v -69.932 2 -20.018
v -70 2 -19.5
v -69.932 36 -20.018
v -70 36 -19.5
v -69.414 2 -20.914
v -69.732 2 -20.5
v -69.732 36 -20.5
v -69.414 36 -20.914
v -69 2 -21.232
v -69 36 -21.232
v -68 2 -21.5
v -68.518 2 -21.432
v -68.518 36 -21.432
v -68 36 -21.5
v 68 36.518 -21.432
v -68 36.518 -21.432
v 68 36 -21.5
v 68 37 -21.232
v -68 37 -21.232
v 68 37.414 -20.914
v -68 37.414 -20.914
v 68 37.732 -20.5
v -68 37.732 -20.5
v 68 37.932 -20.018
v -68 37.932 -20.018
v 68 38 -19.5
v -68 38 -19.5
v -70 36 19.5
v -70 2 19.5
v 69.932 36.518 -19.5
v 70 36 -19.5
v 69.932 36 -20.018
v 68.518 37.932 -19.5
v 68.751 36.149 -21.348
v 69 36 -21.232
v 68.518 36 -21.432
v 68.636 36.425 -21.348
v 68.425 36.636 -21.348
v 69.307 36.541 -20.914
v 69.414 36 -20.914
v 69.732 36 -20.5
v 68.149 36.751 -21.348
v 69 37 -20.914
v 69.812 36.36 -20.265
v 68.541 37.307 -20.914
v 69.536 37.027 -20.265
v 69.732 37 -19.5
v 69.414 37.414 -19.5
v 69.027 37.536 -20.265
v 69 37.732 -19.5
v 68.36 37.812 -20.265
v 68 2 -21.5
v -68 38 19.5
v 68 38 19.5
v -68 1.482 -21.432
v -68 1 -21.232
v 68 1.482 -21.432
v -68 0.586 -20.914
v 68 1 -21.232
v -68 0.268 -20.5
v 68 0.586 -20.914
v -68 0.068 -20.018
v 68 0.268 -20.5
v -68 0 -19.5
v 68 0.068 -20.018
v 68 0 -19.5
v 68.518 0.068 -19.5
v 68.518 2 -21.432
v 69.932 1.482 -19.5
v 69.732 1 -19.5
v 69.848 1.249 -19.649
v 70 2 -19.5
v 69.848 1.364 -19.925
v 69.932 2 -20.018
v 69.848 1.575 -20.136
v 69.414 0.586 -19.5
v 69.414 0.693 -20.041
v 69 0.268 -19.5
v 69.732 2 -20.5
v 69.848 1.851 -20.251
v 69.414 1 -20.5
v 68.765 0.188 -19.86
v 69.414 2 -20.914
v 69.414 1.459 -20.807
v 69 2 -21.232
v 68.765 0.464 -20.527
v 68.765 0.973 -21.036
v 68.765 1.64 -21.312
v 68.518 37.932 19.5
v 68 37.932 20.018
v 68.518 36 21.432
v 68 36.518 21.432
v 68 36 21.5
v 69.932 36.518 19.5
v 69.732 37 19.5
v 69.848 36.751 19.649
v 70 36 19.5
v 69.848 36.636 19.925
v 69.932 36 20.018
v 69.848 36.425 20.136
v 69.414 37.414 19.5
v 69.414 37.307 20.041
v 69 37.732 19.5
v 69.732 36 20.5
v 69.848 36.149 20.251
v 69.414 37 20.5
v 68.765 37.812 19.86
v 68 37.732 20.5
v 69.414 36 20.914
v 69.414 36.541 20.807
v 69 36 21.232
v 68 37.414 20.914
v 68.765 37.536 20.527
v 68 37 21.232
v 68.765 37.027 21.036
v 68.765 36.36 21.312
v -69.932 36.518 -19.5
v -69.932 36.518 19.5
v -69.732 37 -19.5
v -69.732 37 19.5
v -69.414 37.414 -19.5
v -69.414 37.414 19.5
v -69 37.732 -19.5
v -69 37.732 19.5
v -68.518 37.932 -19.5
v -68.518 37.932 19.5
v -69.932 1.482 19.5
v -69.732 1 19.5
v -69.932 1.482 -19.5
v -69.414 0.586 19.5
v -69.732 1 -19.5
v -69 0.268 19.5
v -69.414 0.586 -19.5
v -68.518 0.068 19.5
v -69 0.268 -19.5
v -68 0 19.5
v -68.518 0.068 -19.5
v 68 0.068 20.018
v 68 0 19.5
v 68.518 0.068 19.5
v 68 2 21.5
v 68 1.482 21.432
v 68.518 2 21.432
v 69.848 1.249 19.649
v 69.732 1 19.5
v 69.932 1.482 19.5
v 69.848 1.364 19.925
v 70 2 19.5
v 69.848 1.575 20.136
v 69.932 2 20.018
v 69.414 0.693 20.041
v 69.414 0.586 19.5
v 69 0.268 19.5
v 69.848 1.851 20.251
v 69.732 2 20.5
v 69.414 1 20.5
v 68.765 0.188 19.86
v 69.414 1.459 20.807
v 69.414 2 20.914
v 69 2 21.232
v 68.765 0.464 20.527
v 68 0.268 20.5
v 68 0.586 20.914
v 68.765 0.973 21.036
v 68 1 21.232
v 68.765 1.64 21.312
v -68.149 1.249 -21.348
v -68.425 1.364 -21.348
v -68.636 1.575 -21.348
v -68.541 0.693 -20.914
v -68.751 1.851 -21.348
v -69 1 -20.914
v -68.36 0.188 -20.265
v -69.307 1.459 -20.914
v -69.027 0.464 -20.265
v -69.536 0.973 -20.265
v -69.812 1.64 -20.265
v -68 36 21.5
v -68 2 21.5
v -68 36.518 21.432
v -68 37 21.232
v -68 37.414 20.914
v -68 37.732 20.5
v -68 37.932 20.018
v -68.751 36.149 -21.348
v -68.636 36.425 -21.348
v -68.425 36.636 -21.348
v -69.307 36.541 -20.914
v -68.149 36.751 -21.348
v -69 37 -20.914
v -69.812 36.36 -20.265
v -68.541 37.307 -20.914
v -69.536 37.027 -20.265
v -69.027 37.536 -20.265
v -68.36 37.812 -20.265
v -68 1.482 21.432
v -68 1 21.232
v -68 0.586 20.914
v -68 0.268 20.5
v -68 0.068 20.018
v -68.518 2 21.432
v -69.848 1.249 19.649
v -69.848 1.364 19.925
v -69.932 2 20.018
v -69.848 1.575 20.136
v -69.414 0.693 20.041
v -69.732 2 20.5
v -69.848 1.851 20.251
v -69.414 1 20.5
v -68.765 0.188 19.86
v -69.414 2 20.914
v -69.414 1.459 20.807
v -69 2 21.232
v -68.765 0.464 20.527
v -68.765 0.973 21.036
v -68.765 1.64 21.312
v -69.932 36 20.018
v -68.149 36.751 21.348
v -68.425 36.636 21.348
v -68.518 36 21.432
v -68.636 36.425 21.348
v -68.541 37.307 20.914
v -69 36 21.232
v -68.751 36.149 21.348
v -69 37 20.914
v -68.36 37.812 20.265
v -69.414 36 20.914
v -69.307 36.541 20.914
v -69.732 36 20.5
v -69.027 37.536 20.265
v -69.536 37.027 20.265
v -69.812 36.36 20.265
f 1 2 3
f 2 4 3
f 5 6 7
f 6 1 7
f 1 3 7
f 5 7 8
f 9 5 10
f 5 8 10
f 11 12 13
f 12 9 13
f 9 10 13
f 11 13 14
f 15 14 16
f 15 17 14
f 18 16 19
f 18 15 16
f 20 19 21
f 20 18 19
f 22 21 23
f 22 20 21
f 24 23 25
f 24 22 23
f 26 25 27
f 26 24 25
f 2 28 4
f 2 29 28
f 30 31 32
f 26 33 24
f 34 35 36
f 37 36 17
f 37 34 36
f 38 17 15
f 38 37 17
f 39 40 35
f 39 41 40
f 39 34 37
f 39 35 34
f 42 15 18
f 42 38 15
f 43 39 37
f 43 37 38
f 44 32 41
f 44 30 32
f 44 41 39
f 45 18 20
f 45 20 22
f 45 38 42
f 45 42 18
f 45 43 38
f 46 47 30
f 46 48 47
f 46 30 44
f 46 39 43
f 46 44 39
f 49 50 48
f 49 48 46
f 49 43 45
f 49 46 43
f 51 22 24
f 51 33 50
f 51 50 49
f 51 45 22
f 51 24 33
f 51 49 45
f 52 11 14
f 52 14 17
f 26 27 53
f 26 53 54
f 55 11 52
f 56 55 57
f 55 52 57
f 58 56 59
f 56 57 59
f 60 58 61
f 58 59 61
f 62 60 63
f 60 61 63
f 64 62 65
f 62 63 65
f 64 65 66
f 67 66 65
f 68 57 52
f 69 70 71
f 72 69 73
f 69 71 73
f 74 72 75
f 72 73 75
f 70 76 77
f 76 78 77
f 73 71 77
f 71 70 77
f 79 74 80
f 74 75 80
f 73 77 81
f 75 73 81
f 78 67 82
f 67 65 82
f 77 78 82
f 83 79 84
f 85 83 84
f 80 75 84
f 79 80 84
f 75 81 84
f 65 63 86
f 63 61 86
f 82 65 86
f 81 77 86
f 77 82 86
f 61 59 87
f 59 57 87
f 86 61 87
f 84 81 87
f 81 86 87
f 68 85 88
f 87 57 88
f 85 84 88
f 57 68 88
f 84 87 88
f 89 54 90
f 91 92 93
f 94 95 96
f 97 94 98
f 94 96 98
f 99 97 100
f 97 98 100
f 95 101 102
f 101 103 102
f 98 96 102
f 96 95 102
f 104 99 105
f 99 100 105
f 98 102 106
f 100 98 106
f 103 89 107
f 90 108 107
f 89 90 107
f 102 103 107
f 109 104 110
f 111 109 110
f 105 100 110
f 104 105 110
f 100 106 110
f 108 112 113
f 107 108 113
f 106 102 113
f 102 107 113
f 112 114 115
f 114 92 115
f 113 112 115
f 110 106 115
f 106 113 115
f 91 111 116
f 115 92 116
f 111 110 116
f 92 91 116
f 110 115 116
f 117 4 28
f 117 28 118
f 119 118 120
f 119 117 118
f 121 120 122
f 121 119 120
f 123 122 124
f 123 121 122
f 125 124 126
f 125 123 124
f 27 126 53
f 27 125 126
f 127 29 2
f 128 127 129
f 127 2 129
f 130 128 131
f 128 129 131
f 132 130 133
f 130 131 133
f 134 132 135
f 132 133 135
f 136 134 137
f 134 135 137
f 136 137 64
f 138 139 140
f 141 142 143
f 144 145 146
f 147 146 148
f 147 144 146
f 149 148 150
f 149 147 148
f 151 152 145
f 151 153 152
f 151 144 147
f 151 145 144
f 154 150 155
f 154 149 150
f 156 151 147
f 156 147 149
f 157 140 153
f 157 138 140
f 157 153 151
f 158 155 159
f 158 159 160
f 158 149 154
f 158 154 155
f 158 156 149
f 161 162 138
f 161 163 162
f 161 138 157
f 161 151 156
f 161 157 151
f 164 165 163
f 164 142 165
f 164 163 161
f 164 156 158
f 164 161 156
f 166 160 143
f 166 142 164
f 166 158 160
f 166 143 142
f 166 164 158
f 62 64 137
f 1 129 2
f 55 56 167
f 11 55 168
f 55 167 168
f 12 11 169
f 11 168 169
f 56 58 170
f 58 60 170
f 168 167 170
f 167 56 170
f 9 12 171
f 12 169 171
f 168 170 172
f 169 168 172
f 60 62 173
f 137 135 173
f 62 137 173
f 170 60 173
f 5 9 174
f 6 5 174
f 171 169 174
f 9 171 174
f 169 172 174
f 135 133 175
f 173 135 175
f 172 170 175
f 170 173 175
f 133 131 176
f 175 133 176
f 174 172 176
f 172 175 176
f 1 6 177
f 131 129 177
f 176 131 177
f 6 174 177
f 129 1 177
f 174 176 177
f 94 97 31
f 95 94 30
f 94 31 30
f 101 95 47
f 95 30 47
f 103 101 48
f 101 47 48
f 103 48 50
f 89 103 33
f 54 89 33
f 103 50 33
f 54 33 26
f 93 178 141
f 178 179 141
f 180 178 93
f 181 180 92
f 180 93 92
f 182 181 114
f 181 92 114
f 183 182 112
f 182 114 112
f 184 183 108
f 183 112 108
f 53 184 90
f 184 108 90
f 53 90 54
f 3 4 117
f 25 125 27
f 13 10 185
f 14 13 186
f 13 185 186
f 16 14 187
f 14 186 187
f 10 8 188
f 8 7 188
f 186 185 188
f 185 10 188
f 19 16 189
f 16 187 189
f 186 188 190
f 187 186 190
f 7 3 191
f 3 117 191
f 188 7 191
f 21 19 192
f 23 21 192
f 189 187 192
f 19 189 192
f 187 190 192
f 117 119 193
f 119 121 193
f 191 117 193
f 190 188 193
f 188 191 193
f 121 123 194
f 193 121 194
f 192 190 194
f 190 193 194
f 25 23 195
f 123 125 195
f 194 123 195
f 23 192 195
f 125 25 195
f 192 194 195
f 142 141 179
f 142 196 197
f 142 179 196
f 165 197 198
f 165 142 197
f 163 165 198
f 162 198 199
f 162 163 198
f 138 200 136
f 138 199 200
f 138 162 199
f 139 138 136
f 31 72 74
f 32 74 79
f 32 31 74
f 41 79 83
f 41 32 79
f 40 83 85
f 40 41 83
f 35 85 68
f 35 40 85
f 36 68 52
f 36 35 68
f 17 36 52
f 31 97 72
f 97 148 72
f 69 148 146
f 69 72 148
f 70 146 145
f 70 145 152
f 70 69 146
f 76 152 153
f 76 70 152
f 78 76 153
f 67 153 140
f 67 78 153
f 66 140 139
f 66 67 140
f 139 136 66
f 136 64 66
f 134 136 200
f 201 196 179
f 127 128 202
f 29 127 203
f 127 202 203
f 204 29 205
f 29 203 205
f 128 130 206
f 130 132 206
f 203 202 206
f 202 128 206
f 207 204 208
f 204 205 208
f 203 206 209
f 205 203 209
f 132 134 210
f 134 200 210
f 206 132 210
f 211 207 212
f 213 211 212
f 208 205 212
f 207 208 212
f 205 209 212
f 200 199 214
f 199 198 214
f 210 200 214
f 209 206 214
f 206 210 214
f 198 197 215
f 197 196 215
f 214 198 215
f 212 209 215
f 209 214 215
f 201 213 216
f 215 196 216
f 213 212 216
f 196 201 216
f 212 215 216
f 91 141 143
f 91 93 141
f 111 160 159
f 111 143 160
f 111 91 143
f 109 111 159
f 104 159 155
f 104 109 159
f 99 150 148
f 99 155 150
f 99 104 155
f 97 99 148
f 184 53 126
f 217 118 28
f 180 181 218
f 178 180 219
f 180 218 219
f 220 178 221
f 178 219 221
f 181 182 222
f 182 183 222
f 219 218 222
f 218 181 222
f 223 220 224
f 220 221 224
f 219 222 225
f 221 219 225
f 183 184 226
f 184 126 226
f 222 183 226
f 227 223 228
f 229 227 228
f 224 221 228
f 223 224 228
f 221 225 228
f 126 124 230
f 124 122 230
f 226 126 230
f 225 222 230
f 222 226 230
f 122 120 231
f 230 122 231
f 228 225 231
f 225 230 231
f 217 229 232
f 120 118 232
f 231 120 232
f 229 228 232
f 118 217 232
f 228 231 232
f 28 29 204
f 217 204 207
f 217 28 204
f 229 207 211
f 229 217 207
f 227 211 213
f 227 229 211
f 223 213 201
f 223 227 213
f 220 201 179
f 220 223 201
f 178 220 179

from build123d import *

# Parameters (mm, degrees)
SZKIC1_W                    = 140
SZKIC1_H                    = 43
DODANIE_WYCI_GNI_CIE1_DEPTH = 38
ZAOKR_GLENIE1_R             = 2


with BuildPart() as part:
    # Szkic1 → Dodanie-wyciągnięcie1 (new body)
    with BuildSketch(Plane(origin=(0, 0, 0), x_dir=(1, 0, 0), z_dir=(0, 1, 0))):
        Rectangle(SZKIC1_W, SZKIC1_H)
    extrude(amount=DODANIE_WYCI_GNI_CIE1_DEPTH)

    # Zaokrąglenie1
    zaokr_glenie1_edges = [part.edges().sort_by_distance(p)[0] for p in [
        (-70, 38, 0),
        (0, 38, 21.5),
        (70, 38, 0),
        (0, 0, 21.5),
        (-70, 0, 0),
        (0, 0, -21.5),
        (70, 0, 0),
        (70, 19, 21.5),
        (-70, 19, 21.5),
        (-70, 19, -21.5),
        (70, 19, -21.5),
        (0, 38, -21.5),
    ]]
    fillet(zaokr_glenie1_edges, radius=ZAOKR_GLENIE1_R)


solid = part.part
